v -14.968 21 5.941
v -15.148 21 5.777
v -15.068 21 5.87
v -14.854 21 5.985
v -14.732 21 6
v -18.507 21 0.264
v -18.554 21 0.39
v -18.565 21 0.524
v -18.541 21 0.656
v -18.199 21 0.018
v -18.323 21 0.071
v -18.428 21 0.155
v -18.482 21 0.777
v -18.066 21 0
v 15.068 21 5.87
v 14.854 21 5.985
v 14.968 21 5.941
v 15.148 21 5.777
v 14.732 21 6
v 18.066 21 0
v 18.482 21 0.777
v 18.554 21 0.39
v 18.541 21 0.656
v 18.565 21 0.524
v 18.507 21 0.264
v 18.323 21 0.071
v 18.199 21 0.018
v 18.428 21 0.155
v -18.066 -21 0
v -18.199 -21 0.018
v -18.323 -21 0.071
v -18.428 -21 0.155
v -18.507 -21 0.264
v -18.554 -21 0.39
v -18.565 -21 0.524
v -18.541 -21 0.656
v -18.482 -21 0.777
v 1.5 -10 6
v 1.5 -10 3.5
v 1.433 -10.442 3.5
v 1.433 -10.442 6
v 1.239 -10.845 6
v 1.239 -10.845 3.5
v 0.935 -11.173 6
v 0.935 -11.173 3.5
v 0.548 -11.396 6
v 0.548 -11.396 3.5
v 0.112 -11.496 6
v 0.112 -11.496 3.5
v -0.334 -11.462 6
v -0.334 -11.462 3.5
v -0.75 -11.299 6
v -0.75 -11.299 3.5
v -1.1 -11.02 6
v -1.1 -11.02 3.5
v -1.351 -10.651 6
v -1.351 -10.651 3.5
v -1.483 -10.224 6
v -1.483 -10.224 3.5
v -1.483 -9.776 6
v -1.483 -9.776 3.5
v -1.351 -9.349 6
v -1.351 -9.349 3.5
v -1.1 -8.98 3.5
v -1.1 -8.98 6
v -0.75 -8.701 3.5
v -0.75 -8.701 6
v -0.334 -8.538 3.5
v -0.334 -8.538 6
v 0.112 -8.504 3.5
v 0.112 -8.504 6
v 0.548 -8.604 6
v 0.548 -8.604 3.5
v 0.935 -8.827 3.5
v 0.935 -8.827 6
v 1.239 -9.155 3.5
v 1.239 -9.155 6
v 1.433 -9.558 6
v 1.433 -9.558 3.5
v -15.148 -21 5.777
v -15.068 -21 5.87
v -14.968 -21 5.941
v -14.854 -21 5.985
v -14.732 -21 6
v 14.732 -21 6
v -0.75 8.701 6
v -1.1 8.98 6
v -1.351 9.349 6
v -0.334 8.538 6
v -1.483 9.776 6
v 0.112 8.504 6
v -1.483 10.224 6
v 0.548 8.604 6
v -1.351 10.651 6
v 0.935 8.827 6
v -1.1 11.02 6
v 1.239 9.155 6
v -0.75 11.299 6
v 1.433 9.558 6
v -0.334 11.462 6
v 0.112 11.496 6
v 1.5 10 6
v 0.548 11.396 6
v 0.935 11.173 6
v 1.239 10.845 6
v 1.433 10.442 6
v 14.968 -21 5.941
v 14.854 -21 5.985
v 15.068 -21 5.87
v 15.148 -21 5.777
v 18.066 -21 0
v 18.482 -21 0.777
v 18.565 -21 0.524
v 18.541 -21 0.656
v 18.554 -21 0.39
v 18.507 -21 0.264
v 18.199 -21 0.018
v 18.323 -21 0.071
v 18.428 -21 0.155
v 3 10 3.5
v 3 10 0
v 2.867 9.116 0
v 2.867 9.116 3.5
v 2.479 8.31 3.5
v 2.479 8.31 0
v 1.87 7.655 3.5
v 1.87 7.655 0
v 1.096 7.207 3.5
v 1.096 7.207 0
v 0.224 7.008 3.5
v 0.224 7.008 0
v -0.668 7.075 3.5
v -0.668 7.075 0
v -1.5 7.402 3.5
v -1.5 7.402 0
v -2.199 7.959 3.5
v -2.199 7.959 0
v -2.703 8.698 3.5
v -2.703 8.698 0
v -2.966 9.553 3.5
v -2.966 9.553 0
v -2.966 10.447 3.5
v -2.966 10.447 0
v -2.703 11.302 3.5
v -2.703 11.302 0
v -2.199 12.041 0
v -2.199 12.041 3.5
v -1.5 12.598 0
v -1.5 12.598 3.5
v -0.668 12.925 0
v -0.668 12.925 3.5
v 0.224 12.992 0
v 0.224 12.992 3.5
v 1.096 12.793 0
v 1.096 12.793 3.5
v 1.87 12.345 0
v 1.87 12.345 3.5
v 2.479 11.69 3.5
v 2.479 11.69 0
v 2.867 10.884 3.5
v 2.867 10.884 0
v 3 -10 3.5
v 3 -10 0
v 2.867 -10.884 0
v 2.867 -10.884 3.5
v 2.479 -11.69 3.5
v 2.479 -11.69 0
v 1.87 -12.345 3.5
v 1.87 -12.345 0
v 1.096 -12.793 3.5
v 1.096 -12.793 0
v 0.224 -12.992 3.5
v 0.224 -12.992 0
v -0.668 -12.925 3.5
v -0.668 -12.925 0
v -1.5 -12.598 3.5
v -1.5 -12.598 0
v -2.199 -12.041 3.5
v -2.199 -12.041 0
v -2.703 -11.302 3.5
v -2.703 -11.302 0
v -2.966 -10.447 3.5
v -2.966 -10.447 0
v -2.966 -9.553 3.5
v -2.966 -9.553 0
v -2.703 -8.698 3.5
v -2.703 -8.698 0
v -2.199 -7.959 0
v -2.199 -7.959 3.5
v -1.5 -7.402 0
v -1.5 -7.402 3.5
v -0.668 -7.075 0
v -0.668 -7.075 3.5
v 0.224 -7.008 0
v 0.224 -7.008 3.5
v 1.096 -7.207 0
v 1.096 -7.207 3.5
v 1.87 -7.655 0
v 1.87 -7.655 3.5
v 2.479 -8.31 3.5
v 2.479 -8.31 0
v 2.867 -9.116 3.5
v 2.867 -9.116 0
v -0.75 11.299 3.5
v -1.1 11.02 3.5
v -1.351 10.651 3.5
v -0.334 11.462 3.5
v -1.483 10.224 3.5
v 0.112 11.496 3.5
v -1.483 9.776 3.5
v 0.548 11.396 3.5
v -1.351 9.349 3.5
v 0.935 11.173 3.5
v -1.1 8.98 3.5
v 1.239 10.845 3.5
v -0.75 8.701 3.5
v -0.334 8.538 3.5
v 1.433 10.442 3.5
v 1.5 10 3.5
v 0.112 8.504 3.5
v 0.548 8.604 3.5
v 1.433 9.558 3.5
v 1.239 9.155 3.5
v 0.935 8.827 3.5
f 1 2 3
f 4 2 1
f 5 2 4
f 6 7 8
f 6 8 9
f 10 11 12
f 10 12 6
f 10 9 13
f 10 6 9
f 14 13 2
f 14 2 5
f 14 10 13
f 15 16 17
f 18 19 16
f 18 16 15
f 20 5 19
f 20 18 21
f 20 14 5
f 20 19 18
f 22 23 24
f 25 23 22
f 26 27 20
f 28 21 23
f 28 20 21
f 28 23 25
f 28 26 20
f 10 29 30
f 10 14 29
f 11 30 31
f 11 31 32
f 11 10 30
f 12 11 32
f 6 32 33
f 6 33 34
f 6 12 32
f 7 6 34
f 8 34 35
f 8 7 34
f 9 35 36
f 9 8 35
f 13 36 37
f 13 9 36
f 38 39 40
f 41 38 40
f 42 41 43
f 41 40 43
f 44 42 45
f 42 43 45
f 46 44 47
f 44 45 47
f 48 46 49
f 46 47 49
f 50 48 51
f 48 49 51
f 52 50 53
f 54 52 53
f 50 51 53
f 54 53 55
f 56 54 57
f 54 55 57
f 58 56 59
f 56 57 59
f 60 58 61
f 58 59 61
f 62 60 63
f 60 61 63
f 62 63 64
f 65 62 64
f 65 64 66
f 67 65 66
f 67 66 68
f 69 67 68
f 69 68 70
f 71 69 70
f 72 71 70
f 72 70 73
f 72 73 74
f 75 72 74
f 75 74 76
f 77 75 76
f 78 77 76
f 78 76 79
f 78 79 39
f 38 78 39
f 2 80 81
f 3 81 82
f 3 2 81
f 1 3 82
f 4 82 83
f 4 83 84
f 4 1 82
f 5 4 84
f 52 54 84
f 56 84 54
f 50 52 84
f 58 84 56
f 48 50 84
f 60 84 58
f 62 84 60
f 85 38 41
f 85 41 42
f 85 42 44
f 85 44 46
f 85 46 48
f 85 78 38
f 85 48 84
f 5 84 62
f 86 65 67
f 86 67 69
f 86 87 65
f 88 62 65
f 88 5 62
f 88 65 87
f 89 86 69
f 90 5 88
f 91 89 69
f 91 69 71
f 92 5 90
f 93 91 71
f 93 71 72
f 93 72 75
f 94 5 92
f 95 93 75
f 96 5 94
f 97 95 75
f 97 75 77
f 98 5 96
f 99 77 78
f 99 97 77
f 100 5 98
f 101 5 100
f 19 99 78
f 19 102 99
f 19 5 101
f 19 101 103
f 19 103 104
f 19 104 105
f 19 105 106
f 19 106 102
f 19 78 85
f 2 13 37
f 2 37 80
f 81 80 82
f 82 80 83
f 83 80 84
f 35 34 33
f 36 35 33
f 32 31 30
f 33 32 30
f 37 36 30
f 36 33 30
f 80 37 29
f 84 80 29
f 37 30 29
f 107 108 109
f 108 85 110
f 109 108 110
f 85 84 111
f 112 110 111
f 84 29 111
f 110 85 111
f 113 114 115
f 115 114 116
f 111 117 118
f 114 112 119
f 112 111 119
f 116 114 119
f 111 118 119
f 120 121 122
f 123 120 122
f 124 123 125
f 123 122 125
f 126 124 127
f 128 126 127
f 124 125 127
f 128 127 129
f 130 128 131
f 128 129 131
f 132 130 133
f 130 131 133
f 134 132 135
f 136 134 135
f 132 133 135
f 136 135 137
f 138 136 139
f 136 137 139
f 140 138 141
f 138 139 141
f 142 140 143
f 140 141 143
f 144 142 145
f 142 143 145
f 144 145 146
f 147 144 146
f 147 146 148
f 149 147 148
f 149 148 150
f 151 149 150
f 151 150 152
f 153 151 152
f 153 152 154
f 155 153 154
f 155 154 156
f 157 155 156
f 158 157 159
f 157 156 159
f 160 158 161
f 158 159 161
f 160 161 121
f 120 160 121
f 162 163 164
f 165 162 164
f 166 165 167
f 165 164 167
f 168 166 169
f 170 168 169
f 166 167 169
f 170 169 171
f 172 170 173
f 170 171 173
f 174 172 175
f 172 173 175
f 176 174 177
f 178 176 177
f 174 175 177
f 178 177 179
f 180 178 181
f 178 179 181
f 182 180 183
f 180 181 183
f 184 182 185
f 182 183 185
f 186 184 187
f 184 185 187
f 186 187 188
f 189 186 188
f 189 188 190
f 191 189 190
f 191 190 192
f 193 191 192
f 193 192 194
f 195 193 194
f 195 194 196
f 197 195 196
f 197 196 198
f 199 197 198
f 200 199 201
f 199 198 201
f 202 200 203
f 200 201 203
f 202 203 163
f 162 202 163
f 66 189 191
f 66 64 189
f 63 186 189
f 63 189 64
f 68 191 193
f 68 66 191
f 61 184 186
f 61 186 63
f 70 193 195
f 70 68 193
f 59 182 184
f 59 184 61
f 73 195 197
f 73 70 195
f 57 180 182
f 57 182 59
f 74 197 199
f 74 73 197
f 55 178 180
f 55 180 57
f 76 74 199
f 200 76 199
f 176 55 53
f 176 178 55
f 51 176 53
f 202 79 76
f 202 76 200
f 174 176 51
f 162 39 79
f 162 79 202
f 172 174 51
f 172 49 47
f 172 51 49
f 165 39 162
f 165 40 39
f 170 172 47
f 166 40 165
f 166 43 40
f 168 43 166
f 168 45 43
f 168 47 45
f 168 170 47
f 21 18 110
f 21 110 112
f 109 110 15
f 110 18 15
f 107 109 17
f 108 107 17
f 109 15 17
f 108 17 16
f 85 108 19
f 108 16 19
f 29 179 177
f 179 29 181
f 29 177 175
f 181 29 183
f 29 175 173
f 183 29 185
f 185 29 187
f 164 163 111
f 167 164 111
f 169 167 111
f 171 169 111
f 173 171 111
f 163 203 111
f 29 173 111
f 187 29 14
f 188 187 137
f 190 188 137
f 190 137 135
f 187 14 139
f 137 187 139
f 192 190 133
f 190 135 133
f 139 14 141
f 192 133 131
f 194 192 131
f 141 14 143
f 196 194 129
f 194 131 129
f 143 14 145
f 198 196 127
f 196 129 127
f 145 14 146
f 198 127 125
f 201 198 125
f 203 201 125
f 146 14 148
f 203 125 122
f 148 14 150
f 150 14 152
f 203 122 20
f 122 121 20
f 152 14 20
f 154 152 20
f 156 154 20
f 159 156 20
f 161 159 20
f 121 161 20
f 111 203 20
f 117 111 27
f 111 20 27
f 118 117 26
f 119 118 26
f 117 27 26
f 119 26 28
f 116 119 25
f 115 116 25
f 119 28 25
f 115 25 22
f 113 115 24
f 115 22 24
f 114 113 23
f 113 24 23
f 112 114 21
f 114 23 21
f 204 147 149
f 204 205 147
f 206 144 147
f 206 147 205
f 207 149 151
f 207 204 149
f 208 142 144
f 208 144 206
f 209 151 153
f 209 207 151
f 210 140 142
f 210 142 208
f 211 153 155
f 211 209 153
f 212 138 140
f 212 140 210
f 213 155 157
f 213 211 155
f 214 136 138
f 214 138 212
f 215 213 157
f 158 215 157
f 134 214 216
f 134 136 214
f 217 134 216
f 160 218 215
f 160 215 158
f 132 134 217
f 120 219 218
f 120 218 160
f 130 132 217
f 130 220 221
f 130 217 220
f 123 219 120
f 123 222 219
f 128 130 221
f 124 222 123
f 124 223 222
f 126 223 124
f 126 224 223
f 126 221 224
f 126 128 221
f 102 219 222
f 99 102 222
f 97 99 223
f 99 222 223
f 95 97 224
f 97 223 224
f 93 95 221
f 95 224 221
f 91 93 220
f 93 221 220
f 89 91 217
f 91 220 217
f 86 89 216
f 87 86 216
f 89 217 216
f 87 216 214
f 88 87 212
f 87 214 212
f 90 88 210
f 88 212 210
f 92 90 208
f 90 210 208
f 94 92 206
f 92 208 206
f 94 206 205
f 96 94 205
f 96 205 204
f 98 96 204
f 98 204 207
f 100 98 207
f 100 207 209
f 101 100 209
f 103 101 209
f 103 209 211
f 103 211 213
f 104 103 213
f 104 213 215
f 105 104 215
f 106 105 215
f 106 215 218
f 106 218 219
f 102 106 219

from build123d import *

# Parameters (mm, degrees)
F0_W     = 38
F0_H     = 42
F1_DEPTH = 6
F3_DEPTH = 42
F4_R     = 0.5
F5_R     = 3
F6_DEPTH = 3.5
F7_R     = 1.5
F8_R     = 1.5
F9_DEPTH = 5


with BuildPart() as f1:
    # F0 (on Top) → F1 (new body)
    with BuildSketch(Plane.XY):
        Rectangle(F0_W, F0_H)
    extrude(amount=F1_DEPTH)

    # F2 (on face) → F3 (cut)
    with BuildSketch(Plane.XZ.offset(21)):
        Polygon((15, 6), (19, 0), (19, 6), align=None)
        Polygon((-15, 6), (-19, 6), (-19, 0), align=None)
    extrude(amount=-F3_DEPTH, mode=Mode.SUBTRACT)

    # F4
    f4_edges = [f1.edges().sort_by_distance(p)[0] for p in [
        (-19, 0, 0),
        (19, 0, 0),
        (-15, 0, 6),
        (15, 0, 6),
    ]]
    fillet(f4_edges, radius=F4_R)

    # F5 (on face) → F6 (cut)
    with BuildSketch(Plane(origin=(0, 0, 0), x_dir=(1, 0, 0), z_dir=(0, 0, -1))):
        with Locations((0, 10)):
            Circle(F5_R)
        with Locations((0, -10)):
            Circle(F5_R)
    extrude(amount=-F6_DEPTH, mode=Mode.SUBTRACT)

    # F7 (on face) + F8 (on face) → F9 (cut)
    with BuildSketch(Plane(origin=(0, 0, 3.5), x_dir=(1, 0, 0), z_dir=(0, 0, -1))):
        with Locations((0, 10)):
            Circle(F7_R)
    with BuildSketch(Plane(origin=(0, 0, 3.5), x_dir=(1, 0, 0), z_dir=(0, 0, -1))):
        with Locations((0, -10)):
            Circle(F8_R)
    extrude(amount=-F9_DEPTH, mode=Mode.SUBTRACT)


solid = f1.part
